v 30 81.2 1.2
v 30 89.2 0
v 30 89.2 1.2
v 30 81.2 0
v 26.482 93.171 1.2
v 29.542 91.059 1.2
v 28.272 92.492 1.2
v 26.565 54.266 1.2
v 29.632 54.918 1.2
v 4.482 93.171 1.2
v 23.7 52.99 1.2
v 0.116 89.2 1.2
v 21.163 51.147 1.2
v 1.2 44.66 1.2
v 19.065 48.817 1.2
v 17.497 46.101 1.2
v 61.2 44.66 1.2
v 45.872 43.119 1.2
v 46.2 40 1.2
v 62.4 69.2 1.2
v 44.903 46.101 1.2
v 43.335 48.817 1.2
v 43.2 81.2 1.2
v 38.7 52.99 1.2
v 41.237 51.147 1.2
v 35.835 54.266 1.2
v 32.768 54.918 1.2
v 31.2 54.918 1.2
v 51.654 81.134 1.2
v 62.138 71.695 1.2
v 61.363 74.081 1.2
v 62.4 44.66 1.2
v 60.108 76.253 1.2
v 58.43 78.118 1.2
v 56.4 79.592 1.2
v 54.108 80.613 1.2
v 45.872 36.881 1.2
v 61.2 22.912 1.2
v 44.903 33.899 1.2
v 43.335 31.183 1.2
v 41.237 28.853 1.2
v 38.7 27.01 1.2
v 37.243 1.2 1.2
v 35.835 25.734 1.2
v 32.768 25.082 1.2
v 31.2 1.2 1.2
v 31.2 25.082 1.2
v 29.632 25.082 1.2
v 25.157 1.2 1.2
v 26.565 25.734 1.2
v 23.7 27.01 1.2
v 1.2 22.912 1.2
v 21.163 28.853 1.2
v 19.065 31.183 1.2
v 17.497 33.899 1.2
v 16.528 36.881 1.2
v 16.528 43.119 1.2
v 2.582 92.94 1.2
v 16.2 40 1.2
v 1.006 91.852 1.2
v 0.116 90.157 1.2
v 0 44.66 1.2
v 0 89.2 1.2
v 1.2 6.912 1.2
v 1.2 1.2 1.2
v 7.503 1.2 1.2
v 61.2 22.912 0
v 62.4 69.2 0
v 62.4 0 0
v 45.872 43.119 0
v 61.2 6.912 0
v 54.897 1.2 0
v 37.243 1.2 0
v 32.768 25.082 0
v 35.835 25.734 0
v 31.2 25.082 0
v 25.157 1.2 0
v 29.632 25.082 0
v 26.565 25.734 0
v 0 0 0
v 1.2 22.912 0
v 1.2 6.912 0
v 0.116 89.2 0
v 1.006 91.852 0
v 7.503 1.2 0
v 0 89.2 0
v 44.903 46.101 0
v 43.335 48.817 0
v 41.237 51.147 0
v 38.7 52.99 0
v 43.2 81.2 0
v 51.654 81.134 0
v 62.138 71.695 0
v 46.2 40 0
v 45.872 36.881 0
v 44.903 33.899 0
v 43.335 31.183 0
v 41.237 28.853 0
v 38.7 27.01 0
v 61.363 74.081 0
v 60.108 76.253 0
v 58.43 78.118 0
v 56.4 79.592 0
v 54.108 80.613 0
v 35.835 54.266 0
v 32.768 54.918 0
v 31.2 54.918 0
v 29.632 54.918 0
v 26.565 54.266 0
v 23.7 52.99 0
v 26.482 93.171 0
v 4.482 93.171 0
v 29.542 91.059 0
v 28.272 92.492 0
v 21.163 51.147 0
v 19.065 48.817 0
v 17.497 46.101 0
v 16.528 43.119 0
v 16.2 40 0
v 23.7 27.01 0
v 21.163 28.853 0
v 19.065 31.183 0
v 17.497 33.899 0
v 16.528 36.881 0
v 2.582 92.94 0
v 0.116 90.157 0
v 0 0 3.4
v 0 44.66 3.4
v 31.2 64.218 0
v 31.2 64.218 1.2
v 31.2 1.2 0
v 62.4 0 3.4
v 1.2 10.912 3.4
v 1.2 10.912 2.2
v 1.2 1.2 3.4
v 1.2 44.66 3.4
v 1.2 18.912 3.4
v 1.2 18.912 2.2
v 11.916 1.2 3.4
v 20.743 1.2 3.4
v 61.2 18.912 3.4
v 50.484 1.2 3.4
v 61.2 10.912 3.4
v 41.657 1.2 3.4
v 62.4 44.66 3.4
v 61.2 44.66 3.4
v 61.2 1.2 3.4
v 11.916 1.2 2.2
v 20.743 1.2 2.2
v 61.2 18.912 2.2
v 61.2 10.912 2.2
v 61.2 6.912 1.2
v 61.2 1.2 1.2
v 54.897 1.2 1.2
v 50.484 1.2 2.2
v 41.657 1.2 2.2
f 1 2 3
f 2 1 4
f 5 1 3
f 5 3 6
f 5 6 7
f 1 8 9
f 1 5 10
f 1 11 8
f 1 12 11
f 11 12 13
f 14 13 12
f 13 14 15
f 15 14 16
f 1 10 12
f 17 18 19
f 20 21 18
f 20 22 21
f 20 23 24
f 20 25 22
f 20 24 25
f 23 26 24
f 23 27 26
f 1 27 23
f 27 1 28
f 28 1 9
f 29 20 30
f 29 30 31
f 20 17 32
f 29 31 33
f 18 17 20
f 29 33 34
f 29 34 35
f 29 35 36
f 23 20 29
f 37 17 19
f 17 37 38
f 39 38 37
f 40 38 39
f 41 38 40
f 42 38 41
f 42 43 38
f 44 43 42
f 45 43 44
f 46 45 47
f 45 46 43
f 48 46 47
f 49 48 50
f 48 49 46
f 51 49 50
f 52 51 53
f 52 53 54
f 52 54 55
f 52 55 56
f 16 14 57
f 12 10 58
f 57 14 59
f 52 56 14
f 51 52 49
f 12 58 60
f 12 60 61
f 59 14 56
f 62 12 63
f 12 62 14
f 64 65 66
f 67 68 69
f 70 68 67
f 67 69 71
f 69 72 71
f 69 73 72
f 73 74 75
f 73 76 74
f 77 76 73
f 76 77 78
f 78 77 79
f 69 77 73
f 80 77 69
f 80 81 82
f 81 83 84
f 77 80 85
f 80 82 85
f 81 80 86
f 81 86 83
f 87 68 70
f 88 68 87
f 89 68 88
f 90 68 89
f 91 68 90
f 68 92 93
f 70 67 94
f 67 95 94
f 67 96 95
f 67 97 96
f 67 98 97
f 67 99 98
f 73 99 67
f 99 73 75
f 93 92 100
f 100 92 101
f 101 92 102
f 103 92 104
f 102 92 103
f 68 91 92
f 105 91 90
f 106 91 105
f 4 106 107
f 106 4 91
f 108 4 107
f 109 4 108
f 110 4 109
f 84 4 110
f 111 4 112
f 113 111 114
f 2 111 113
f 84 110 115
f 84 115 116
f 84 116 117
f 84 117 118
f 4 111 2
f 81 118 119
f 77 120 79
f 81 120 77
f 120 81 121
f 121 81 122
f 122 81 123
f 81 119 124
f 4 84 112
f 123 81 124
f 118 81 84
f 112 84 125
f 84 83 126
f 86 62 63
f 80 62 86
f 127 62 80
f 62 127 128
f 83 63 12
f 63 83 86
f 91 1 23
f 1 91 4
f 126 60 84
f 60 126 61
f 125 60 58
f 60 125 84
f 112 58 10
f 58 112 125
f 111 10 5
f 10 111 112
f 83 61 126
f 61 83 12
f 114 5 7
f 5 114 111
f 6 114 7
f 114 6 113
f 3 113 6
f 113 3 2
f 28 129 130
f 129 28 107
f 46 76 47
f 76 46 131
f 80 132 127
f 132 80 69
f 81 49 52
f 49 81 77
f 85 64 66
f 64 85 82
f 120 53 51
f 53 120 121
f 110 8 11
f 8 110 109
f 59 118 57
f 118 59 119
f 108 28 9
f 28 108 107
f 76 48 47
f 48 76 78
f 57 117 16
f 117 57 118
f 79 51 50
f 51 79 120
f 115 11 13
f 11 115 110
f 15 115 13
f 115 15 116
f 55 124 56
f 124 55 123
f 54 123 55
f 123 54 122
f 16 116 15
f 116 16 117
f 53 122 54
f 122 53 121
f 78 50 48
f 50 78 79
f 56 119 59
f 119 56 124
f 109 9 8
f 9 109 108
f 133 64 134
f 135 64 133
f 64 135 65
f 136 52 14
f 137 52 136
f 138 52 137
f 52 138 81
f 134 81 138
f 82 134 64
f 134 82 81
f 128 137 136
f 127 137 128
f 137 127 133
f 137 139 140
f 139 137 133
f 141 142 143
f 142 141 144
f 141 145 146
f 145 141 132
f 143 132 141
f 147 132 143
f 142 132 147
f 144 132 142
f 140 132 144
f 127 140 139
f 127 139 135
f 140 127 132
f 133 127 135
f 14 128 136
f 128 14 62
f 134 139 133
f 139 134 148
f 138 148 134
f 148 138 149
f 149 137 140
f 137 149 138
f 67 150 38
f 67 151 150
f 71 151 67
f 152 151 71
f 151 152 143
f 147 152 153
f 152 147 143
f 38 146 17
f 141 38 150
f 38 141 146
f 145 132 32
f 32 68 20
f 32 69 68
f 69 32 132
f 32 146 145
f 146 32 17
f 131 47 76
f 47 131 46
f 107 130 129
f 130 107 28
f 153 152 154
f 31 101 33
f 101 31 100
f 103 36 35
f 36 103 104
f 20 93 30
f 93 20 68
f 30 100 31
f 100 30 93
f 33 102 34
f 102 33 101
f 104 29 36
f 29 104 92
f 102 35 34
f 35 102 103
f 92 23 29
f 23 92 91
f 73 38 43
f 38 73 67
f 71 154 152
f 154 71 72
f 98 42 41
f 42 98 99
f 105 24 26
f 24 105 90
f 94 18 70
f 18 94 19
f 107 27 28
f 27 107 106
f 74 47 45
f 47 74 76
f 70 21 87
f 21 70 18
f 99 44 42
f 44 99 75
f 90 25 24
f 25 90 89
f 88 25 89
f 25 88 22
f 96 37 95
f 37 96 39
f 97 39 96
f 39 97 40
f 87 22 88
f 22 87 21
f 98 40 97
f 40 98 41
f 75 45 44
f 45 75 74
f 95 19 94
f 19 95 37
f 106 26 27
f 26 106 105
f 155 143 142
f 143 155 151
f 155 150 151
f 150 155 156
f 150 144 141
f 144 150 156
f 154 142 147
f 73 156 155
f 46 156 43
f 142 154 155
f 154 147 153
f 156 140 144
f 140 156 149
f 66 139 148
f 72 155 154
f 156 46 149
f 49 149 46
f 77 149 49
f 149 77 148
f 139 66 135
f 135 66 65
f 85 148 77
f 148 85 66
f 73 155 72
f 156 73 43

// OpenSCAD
// width of the cards to put inside the sleeve
CARD_WIDTH = 60;

// height of the cards to put inside the sleeve
CARD_HEIGHT = 80;

// width of the deck of cards to put inside the sleeve
DECK_WIDTH = 1;

// height of the tab beyond CARD_HEIGHT
TAB_HEIGHT = 12;

// distance the sides will extend up the sleeve as percent of sleeve height
SIDES_PCT_OF_HEIGHT = 0.55;

// thickness of the sides, bottom, back, and bands
THICKNESS = 1.2;

// radius of the fillet at top of tab, set to zero if tab height is 0
TAB_FILLET = 4;

// where along side the band will start
BAND_HEIGHT = 12;

// the width of the band
BAND_WIDTH = 8;

// the angle with respect to the side at which the band will extend towards bottom
BAND_ANGLE = 25;

// added to band_width for cutout width on back
EXTRA_CUT_WIDTH = 4;


// Add bands to the top (true) or leave it open (false)
TOP_BANDS = false;

// amount to chamfer off top corner of side
SIDE_CHAMFER = 0;
// radius of the fillet at the top of the back
BACK_FILLET = 12;

FILLET_LEFT = false;
FILLET_RIGHT = true;
//DO NOT EDIT, total width of the sleeve
SLEEVE_WIDTH = CARD_WIDTH + 2*THICKNESS;

//DO NOT EDIT, total width of the sleeve
SLEEVE_DEPTH = DECK_WIDTH + THICKNESS*2;

// where along top the tab will start
TAB_LEFT_START = 0;
// where along top the tab will end
TAB_RIGHT_END = 30;

// diameter of circle to cut out of back to save filament
CUT_OUT_DIAMETER = 30;

/**********************************/

module left_back(fillet=true)
{
    factor = TOP_BANDS ? 2 : 1;
    back_height = (THICKNESS*factor + CARD_HEIGHT) / factor;
    cut_x_1 = (BAND_HEIGHT - EXTRA_CUT_WIDTH) / cos(BAND_ANGLE);
    cut_x_2 = (BAND_HEIGHT + BAND_WIDTH +  EXTRA_CUT_WIDTH) / cos(BAND_ANGLE);
    cutoff = fillet ? BACK_FILLET : 0;

    difference()
    {
        union()
        {
            cube([ SLEEVE_WIDTH/2, back_height - cutoff, THICKNESS]);
            if (fillet)
            {
              hull()
              {
                  translate([BACK_FILLET, back_height - BACK_FILLET, 0 ] )
                    cylinder(h=THICKNESS, r=BACK_FILLET);
                  translate([SLEEVE_WIDTH/2 - BACK_FILLET, back_height - BACK_FILLET, 0 ] )
                      cube([BACK_FILLET*2, BACK_FILLET, THICKNESS]);

              }
            }
        }
        // cut around bands
        linear_extrude(THICKNESS)
        {
            polygon([ [0,BAND_HEIGHT + BAND_WIDTH + EXTRA_CUT_WIDTH],
                      [0, BAND_HEIGHT - EXTRA_CUT_WIDTH],
                      [cut_x_1, 0],
                      [cut_x_2 ,0]   ]);
        }
        //cut out
        translate([SLEEVE_WIDTH/2, CARD_HEIGHT/2, 0])
            cylinder(h=THICKNESS, d=CUT_OUT_DIAMETER);
    }
}

module tab()
{
  factor = TOP_BANDS ? 2 : 1;
  sleeve_height = CARD_HEIGHT + THICKNESS * factor;
    translate([TAB_LEFT_START, sleeve_height, 0])
        cube([TAB_RIGHT_END - TAB_LEFT_START,
              TAB_HEIGHT - TAB_FILLET,
              THICKNESS]);
    hull()
    {
        translate([TAB_FILLET + TAB_LEFT_START,
                   sleeve_height + TAB_HEIGHT - TAB_FILLET,
                   0])
            cylinder(h=THICKNESS, r=TAB_FILLET);
        translate([TAB_RIGHT_END - TAB_FILLET,
                   sleeve_height + TAB_HEIGHT - TAB_FILLET,
                   0])
            cylinder(h=THICKNESS, r=TAB_FILLET);
    }
}

module bottom()
{
    factor = TOP_BANDS ? 2 : 1;
    cube([SLEEVE_WIDTH, THICKNESS, SLEEVE_DEPTH]);
    if (TOP_BANDS)
    {
      translate([0,CARD_HEIGHT + THICKNESS*factor, 0])
        mirror([0,1,0])
        {
          cube([SLEEVE_WIDTH, THICKNESS, SLEEVE_DEPTH]);
        }
      }
}

module left_side()
{
    factor = TOP_BANDS ? 2 : 1;
    sleeve_height = THICKNESS*factor + CARD_HEIGHT;
    difference()
    {
        cube([THICKNESS, sleeve_height * SIDES_PCT_OF_HEIGHT, SLEEVE_DEPTH]);

        translate([THICKNESS/2, sleeve_height * SIDES_PCT_OF_HEIGHT, SLEEVE_DEPTH])
            rotate(45, [1,0,0])
                cube([THICKNESS, SIDE_CHAMFER, SIDE_CHAMFER], center=true);
    }
}

module left_band()
{
    band_x_1 = BAND_HEIGHT / cos(BAND_ANGLE);
    band_x_2 = (BAND_HEIGHT+BAND_WIDTH) / cos(BAND_ANGLE);

    translate([0,0,SLEEVE_DEPTH-THICKNESS])
    linear_extrude(THICKNESS)
    {
        polygon( [[0, BAND_HEIGHT+BAND_WIDTH],
                  [0, BAND_HEIGHT],
                  [band_x_1, 0],
                  [band_x_2, 0] ]);
    }
}

module front_left_parts(fillet=true)
{
  left_back(fillet);
  left_side();
  left_band();

  if (TOP_BANDS)
  {
    translate([0,CARD_HEIGHT + THICKNESS*2, 0])
      mirror([0,1,0])
      {
        left_back();
        left_side();
        left_band();
      }
  }
}
/******************************************/

bottom();
tab();

front_left_parts(FILLET_LEFT);
translate([SLEEVE_WIDTH,0,0])
    mirror([1,0,0]){
      front_left_parts(FILLET_RIGHT);
    }
